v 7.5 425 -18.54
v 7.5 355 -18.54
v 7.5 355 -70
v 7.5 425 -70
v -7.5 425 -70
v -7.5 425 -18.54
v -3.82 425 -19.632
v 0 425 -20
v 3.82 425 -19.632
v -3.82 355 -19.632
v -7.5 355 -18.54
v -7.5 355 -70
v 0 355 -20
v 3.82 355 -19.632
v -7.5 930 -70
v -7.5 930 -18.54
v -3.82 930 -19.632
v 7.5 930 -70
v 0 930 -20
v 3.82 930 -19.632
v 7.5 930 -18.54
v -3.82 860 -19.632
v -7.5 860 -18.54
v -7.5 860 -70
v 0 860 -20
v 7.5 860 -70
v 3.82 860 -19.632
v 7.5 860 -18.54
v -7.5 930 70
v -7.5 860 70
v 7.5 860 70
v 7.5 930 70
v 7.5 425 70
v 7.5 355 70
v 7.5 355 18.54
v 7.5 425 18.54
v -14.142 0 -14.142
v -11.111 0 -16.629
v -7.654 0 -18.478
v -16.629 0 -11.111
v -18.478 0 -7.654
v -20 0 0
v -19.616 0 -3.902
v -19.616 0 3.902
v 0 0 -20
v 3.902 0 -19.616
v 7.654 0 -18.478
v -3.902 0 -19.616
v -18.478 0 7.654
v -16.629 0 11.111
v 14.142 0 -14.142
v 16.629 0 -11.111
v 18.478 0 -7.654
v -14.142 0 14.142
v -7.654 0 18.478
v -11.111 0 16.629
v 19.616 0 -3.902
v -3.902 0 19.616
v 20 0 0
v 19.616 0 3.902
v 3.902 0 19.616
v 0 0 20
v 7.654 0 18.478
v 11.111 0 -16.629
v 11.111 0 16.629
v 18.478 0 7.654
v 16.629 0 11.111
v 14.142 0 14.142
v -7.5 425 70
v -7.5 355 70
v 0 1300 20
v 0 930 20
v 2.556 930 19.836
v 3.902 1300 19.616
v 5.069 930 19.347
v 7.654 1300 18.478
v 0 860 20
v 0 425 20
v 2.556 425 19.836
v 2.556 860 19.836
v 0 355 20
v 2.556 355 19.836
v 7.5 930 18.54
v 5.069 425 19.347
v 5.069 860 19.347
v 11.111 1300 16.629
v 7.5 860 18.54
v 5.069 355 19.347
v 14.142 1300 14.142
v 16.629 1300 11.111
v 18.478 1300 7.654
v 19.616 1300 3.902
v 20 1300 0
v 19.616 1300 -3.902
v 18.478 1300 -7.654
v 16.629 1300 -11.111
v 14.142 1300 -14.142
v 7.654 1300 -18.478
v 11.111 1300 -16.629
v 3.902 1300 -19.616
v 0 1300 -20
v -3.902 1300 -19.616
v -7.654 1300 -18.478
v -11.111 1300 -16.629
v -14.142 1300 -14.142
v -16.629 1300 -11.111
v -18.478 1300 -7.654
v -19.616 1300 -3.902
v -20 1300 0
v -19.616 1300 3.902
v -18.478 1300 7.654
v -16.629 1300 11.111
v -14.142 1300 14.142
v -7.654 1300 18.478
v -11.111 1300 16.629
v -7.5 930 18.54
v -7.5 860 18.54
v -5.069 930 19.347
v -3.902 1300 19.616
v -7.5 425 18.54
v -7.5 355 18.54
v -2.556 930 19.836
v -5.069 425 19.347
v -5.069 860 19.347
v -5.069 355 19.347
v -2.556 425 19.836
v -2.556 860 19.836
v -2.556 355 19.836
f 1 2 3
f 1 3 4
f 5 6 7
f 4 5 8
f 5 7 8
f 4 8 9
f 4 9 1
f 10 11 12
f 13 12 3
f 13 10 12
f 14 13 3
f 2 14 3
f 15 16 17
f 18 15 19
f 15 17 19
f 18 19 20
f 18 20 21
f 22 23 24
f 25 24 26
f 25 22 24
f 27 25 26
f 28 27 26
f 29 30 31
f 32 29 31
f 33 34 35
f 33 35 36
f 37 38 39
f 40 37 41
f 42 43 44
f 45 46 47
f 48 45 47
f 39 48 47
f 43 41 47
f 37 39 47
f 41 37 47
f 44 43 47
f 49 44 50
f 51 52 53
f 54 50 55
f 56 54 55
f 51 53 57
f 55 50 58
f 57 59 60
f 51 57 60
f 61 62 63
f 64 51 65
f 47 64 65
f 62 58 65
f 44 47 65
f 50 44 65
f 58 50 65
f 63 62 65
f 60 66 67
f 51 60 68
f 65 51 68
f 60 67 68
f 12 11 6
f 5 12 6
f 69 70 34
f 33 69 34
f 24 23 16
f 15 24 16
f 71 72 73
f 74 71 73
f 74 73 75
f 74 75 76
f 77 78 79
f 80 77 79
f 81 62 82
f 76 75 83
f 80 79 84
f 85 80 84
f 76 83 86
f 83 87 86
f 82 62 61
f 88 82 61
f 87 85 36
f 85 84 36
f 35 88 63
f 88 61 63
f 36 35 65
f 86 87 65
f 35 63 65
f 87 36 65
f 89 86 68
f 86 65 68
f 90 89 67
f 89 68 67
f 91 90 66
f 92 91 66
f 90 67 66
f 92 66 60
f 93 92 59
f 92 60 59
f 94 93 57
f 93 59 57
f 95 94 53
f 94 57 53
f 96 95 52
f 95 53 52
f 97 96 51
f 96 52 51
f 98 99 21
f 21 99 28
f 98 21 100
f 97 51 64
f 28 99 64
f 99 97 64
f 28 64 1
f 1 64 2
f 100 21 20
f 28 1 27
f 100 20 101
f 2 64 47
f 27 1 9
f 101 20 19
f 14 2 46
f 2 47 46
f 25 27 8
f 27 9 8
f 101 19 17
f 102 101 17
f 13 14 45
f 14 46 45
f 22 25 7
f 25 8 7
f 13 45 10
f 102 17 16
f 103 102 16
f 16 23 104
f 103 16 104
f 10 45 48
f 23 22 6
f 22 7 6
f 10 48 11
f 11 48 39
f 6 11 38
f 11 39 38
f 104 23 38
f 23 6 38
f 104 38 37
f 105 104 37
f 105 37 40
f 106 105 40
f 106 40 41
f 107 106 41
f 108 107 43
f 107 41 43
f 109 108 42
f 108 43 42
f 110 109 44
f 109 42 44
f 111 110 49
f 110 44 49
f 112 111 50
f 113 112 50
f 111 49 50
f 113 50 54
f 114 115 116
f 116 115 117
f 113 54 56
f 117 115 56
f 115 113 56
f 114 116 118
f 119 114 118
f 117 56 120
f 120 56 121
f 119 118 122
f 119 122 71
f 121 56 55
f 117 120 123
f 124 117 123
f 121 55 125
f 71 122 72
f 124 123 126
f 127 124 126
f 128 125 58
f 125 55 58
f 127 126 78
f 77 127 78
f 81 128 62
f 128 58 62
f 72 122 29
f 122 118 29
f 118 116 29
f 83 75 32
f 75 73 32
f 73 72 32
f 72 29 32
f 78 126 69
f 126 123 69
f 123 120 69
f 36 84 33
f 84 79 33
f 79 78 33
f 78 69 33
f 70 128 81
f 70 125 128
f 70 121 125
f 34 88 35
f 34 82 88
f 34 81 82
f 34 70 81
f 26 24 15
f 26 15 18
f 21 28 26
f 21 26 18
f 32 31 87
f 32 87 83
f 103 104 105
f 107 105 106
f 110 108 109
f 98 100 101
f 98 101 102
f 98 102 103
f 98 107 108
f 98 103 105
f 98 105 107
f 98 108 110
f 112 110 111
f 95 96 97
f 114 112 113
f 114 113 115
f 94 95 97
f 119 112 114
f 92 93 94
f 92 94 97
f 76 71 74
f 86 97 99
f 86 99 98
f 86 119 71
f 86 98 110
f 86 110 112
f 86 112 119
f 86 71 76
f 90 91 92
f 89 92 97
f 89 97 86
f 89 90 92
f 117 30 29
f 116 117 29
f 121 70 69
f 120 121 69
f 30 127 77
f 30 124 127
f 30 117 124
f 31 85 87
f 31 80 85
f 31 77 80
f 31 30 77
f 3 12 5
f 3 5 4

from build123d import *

# Parameters (mm, degrees)
ESQUISSE1_R        = 20
BOSS_EXTRU_1_DEPTH = 1300
ESQUISSE2_W        = 15
ESQUISSE2_H        = 70
BOSS_EXTRU_2_DEPTH = 70
ESQUISSE4_W        = 15
ESQUISSE4_H        = 70
BOSS_EXTRU_3_DEPTH = 70


with BuildPart() as part:
    # Esquisse1 → Boss.-Extru.1 (new body)
    with BuildSketch(Plane(origin=(0, 0, 0), x_dir=(1, 0, 0), z_dir=(0, 1, 0))):
        with Locations(Location((0, 0, 0), (0, 0, 270))):
            Circle(ESQUISSE1_R)
    extrude(amount=BOSS_EXTRU_1_DEPTH)

    # Esquisse2 → Boss.-Extru.2 (add, symmetric)
    with BuildSketch(Plane.XY):
        with Locations((0, 390)):
            Rectangle(ESQUISSE2_W, ESQUISSE2_H)
    extrude(amount=BOSS_EXTRU_2_DEPTH, both=True)

    # Esquisse4 → Boss.-Extru.3 (add, symmetric)
    with BuildSketch(Plane.XY):
        with Locations((0, 895)):
            Rectangle(ESQUISSE4_W, ESQUISSE4_H)
    extrude(amount=BOSS_EXTRU_3_DEPTH, both=True)


solid = part.part
